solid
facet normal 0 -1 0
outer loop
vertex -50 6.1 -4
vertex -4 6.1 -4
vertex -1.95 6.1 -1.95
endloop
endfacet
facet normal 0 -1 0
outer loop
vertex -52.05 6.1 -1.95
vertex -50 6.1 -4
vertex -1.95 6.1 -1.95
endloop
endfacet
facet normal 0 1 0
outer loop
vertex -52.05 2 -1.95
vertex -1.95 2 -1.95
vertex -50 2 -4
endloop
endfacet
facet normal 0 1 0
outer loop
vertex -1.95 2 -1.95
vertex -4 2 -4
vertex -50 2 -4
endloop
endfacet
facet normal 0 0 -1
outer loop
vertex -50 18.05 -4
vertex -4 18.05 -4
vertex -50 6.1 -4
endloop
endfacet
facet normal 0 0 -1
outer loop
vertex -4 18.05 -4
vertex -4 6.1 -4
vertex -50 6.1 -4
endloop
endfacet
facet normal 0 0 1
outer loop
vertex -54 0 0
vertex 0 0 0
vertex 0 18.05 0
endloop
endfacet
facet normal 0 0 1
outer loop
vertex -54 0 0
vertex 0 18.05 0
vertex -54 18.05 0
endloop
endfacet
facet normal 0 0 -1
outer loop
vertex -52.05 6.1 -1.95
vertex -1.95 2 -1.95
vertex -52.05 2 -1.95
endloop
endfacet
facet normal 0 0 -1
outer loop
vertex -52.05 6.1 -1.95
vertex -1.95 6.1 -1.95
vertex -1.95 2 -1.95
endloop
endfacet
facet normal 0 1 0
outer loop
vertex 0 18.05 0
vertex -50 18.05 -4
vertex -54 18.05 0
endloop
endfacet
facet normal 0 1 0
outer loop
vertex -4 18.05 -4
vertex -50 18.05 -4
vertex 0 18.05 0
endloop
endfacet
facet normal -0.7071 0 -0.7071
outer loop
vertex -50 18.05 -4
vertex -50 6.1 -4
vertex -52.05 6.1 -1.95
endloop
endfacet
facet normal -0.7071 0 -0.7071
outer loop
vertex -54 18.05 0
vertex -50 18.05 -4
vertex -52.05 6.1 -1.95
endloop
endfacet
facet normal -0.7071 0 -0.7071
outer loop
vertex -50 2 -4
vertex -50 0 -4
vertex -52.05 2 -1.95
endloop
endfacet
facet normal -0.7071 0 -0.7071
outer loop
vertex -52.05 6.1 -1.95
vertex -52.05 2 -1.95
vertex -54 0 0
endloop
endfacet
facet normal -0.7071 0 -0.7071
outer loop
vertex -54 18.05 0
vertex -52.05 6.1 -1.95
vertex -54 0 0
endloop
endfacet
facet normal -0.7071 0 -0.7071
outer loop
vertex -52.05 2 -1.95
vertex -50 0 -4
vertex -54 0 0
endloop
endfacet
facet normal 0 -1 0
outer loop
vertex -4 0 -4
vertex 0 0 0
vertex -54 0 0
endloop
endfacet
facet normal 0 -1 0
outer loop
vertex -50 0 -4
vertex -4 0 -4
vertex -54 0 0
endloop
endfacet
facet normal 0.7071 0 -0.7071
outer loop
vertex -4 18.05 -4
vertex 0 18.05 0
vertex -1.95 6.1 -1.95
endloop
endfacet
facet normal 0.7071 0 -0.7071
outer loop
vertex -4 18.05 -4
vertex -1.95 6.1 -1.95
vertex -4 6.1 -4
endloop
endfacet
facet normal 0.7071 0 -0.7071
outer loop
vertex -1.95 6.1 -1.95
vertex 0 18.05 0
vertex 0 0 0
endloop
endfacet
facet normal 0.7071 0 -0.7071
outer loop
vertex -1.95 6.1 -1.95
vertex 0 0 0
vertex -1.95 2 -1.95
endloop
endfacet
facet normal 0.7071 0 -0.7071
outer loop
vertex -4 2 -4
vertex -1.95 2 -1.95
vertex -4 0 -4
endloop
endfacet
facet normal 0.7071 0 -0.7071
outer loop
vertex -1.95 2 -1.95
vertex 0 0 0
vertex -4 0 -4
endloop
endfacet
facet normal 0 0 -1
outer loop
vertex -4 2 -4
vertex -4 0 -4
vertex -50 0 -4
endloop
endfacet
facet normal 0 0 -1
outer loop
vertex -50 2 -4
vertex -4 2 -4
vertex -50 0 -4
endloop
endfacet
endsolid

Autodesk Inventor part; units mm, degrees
ref_plane "XZ Plane" through (0, 0, 0) normal (0, 1, 0) x (-1, 0, 0)
ref_plane "XY Plane" through (0, 0, 0) normal (0, 0, 1) x (1, 0, 0)
sketch "Sketch1" plane through (0, 0, 0) normal (0, 1, 0) x (-1, 0, 0)
  line L0 (0, 0) -> (54, 0)
  line L1 (4, -4) -> (50, -4)
  line L2 (0, -4) -> (50, -4) construction
  line L3 (50, -4) -> (54, 0)
  line L4 (0, 0) -> (4, -4)
  dimension "d0" = 54
  dimension "d1" = 4
  dimension "d3" = 0
extrude "Extrusion1" add sketch "Sketch1" along normal blind 17
sketch "Sketch2" plane through (-4, 0, -4) normal (0, 0, -1) x (-1, 0, 0)
  line L0 (-4, 0) -> (-4, 17) projected
  line L1 (50, 0) -> (50, 17) projected
  line L2 (-4, 2) -> (50, 2)
  line L3 (50, 2) -> (50, 6.1)
  line L4 (50, 6.1) -> (-4, 6.1)
  line L5 (-4, 6.1) -> (-4, 2)
  line L6 (0, 0) -> (46, 0) projected
  point P0 (-4, 6.1)
  dimension "d6" = 4.1
  dimension "d7" = 2
sketch "Sketch3" plane through (0, 17, 0) normal (0, 1, 0) x (1, 0, 0)
  line L0 (-50, 4) -> (-54, 0) projected
  line L1 (-54, 0) -> (0, 0) projected
  line L2 (0, 0) -> (-4, 4) projected
  line L3 (-4, 4) -> (-50, 4) projected
extrude "Extrusion2" add sketch "Sketch3" along normal blind 1.05
extrude "Extrusion3" cut sketch "Sketch2" against normal blind 2.05
ref_plane "Work Plane1" through (-27, 0, 0) normal (1, 0, 0) x (0, 1, 0)
properties part number "PDMS Chamber-Mold-V8-Left_Right-Wall Steven"
